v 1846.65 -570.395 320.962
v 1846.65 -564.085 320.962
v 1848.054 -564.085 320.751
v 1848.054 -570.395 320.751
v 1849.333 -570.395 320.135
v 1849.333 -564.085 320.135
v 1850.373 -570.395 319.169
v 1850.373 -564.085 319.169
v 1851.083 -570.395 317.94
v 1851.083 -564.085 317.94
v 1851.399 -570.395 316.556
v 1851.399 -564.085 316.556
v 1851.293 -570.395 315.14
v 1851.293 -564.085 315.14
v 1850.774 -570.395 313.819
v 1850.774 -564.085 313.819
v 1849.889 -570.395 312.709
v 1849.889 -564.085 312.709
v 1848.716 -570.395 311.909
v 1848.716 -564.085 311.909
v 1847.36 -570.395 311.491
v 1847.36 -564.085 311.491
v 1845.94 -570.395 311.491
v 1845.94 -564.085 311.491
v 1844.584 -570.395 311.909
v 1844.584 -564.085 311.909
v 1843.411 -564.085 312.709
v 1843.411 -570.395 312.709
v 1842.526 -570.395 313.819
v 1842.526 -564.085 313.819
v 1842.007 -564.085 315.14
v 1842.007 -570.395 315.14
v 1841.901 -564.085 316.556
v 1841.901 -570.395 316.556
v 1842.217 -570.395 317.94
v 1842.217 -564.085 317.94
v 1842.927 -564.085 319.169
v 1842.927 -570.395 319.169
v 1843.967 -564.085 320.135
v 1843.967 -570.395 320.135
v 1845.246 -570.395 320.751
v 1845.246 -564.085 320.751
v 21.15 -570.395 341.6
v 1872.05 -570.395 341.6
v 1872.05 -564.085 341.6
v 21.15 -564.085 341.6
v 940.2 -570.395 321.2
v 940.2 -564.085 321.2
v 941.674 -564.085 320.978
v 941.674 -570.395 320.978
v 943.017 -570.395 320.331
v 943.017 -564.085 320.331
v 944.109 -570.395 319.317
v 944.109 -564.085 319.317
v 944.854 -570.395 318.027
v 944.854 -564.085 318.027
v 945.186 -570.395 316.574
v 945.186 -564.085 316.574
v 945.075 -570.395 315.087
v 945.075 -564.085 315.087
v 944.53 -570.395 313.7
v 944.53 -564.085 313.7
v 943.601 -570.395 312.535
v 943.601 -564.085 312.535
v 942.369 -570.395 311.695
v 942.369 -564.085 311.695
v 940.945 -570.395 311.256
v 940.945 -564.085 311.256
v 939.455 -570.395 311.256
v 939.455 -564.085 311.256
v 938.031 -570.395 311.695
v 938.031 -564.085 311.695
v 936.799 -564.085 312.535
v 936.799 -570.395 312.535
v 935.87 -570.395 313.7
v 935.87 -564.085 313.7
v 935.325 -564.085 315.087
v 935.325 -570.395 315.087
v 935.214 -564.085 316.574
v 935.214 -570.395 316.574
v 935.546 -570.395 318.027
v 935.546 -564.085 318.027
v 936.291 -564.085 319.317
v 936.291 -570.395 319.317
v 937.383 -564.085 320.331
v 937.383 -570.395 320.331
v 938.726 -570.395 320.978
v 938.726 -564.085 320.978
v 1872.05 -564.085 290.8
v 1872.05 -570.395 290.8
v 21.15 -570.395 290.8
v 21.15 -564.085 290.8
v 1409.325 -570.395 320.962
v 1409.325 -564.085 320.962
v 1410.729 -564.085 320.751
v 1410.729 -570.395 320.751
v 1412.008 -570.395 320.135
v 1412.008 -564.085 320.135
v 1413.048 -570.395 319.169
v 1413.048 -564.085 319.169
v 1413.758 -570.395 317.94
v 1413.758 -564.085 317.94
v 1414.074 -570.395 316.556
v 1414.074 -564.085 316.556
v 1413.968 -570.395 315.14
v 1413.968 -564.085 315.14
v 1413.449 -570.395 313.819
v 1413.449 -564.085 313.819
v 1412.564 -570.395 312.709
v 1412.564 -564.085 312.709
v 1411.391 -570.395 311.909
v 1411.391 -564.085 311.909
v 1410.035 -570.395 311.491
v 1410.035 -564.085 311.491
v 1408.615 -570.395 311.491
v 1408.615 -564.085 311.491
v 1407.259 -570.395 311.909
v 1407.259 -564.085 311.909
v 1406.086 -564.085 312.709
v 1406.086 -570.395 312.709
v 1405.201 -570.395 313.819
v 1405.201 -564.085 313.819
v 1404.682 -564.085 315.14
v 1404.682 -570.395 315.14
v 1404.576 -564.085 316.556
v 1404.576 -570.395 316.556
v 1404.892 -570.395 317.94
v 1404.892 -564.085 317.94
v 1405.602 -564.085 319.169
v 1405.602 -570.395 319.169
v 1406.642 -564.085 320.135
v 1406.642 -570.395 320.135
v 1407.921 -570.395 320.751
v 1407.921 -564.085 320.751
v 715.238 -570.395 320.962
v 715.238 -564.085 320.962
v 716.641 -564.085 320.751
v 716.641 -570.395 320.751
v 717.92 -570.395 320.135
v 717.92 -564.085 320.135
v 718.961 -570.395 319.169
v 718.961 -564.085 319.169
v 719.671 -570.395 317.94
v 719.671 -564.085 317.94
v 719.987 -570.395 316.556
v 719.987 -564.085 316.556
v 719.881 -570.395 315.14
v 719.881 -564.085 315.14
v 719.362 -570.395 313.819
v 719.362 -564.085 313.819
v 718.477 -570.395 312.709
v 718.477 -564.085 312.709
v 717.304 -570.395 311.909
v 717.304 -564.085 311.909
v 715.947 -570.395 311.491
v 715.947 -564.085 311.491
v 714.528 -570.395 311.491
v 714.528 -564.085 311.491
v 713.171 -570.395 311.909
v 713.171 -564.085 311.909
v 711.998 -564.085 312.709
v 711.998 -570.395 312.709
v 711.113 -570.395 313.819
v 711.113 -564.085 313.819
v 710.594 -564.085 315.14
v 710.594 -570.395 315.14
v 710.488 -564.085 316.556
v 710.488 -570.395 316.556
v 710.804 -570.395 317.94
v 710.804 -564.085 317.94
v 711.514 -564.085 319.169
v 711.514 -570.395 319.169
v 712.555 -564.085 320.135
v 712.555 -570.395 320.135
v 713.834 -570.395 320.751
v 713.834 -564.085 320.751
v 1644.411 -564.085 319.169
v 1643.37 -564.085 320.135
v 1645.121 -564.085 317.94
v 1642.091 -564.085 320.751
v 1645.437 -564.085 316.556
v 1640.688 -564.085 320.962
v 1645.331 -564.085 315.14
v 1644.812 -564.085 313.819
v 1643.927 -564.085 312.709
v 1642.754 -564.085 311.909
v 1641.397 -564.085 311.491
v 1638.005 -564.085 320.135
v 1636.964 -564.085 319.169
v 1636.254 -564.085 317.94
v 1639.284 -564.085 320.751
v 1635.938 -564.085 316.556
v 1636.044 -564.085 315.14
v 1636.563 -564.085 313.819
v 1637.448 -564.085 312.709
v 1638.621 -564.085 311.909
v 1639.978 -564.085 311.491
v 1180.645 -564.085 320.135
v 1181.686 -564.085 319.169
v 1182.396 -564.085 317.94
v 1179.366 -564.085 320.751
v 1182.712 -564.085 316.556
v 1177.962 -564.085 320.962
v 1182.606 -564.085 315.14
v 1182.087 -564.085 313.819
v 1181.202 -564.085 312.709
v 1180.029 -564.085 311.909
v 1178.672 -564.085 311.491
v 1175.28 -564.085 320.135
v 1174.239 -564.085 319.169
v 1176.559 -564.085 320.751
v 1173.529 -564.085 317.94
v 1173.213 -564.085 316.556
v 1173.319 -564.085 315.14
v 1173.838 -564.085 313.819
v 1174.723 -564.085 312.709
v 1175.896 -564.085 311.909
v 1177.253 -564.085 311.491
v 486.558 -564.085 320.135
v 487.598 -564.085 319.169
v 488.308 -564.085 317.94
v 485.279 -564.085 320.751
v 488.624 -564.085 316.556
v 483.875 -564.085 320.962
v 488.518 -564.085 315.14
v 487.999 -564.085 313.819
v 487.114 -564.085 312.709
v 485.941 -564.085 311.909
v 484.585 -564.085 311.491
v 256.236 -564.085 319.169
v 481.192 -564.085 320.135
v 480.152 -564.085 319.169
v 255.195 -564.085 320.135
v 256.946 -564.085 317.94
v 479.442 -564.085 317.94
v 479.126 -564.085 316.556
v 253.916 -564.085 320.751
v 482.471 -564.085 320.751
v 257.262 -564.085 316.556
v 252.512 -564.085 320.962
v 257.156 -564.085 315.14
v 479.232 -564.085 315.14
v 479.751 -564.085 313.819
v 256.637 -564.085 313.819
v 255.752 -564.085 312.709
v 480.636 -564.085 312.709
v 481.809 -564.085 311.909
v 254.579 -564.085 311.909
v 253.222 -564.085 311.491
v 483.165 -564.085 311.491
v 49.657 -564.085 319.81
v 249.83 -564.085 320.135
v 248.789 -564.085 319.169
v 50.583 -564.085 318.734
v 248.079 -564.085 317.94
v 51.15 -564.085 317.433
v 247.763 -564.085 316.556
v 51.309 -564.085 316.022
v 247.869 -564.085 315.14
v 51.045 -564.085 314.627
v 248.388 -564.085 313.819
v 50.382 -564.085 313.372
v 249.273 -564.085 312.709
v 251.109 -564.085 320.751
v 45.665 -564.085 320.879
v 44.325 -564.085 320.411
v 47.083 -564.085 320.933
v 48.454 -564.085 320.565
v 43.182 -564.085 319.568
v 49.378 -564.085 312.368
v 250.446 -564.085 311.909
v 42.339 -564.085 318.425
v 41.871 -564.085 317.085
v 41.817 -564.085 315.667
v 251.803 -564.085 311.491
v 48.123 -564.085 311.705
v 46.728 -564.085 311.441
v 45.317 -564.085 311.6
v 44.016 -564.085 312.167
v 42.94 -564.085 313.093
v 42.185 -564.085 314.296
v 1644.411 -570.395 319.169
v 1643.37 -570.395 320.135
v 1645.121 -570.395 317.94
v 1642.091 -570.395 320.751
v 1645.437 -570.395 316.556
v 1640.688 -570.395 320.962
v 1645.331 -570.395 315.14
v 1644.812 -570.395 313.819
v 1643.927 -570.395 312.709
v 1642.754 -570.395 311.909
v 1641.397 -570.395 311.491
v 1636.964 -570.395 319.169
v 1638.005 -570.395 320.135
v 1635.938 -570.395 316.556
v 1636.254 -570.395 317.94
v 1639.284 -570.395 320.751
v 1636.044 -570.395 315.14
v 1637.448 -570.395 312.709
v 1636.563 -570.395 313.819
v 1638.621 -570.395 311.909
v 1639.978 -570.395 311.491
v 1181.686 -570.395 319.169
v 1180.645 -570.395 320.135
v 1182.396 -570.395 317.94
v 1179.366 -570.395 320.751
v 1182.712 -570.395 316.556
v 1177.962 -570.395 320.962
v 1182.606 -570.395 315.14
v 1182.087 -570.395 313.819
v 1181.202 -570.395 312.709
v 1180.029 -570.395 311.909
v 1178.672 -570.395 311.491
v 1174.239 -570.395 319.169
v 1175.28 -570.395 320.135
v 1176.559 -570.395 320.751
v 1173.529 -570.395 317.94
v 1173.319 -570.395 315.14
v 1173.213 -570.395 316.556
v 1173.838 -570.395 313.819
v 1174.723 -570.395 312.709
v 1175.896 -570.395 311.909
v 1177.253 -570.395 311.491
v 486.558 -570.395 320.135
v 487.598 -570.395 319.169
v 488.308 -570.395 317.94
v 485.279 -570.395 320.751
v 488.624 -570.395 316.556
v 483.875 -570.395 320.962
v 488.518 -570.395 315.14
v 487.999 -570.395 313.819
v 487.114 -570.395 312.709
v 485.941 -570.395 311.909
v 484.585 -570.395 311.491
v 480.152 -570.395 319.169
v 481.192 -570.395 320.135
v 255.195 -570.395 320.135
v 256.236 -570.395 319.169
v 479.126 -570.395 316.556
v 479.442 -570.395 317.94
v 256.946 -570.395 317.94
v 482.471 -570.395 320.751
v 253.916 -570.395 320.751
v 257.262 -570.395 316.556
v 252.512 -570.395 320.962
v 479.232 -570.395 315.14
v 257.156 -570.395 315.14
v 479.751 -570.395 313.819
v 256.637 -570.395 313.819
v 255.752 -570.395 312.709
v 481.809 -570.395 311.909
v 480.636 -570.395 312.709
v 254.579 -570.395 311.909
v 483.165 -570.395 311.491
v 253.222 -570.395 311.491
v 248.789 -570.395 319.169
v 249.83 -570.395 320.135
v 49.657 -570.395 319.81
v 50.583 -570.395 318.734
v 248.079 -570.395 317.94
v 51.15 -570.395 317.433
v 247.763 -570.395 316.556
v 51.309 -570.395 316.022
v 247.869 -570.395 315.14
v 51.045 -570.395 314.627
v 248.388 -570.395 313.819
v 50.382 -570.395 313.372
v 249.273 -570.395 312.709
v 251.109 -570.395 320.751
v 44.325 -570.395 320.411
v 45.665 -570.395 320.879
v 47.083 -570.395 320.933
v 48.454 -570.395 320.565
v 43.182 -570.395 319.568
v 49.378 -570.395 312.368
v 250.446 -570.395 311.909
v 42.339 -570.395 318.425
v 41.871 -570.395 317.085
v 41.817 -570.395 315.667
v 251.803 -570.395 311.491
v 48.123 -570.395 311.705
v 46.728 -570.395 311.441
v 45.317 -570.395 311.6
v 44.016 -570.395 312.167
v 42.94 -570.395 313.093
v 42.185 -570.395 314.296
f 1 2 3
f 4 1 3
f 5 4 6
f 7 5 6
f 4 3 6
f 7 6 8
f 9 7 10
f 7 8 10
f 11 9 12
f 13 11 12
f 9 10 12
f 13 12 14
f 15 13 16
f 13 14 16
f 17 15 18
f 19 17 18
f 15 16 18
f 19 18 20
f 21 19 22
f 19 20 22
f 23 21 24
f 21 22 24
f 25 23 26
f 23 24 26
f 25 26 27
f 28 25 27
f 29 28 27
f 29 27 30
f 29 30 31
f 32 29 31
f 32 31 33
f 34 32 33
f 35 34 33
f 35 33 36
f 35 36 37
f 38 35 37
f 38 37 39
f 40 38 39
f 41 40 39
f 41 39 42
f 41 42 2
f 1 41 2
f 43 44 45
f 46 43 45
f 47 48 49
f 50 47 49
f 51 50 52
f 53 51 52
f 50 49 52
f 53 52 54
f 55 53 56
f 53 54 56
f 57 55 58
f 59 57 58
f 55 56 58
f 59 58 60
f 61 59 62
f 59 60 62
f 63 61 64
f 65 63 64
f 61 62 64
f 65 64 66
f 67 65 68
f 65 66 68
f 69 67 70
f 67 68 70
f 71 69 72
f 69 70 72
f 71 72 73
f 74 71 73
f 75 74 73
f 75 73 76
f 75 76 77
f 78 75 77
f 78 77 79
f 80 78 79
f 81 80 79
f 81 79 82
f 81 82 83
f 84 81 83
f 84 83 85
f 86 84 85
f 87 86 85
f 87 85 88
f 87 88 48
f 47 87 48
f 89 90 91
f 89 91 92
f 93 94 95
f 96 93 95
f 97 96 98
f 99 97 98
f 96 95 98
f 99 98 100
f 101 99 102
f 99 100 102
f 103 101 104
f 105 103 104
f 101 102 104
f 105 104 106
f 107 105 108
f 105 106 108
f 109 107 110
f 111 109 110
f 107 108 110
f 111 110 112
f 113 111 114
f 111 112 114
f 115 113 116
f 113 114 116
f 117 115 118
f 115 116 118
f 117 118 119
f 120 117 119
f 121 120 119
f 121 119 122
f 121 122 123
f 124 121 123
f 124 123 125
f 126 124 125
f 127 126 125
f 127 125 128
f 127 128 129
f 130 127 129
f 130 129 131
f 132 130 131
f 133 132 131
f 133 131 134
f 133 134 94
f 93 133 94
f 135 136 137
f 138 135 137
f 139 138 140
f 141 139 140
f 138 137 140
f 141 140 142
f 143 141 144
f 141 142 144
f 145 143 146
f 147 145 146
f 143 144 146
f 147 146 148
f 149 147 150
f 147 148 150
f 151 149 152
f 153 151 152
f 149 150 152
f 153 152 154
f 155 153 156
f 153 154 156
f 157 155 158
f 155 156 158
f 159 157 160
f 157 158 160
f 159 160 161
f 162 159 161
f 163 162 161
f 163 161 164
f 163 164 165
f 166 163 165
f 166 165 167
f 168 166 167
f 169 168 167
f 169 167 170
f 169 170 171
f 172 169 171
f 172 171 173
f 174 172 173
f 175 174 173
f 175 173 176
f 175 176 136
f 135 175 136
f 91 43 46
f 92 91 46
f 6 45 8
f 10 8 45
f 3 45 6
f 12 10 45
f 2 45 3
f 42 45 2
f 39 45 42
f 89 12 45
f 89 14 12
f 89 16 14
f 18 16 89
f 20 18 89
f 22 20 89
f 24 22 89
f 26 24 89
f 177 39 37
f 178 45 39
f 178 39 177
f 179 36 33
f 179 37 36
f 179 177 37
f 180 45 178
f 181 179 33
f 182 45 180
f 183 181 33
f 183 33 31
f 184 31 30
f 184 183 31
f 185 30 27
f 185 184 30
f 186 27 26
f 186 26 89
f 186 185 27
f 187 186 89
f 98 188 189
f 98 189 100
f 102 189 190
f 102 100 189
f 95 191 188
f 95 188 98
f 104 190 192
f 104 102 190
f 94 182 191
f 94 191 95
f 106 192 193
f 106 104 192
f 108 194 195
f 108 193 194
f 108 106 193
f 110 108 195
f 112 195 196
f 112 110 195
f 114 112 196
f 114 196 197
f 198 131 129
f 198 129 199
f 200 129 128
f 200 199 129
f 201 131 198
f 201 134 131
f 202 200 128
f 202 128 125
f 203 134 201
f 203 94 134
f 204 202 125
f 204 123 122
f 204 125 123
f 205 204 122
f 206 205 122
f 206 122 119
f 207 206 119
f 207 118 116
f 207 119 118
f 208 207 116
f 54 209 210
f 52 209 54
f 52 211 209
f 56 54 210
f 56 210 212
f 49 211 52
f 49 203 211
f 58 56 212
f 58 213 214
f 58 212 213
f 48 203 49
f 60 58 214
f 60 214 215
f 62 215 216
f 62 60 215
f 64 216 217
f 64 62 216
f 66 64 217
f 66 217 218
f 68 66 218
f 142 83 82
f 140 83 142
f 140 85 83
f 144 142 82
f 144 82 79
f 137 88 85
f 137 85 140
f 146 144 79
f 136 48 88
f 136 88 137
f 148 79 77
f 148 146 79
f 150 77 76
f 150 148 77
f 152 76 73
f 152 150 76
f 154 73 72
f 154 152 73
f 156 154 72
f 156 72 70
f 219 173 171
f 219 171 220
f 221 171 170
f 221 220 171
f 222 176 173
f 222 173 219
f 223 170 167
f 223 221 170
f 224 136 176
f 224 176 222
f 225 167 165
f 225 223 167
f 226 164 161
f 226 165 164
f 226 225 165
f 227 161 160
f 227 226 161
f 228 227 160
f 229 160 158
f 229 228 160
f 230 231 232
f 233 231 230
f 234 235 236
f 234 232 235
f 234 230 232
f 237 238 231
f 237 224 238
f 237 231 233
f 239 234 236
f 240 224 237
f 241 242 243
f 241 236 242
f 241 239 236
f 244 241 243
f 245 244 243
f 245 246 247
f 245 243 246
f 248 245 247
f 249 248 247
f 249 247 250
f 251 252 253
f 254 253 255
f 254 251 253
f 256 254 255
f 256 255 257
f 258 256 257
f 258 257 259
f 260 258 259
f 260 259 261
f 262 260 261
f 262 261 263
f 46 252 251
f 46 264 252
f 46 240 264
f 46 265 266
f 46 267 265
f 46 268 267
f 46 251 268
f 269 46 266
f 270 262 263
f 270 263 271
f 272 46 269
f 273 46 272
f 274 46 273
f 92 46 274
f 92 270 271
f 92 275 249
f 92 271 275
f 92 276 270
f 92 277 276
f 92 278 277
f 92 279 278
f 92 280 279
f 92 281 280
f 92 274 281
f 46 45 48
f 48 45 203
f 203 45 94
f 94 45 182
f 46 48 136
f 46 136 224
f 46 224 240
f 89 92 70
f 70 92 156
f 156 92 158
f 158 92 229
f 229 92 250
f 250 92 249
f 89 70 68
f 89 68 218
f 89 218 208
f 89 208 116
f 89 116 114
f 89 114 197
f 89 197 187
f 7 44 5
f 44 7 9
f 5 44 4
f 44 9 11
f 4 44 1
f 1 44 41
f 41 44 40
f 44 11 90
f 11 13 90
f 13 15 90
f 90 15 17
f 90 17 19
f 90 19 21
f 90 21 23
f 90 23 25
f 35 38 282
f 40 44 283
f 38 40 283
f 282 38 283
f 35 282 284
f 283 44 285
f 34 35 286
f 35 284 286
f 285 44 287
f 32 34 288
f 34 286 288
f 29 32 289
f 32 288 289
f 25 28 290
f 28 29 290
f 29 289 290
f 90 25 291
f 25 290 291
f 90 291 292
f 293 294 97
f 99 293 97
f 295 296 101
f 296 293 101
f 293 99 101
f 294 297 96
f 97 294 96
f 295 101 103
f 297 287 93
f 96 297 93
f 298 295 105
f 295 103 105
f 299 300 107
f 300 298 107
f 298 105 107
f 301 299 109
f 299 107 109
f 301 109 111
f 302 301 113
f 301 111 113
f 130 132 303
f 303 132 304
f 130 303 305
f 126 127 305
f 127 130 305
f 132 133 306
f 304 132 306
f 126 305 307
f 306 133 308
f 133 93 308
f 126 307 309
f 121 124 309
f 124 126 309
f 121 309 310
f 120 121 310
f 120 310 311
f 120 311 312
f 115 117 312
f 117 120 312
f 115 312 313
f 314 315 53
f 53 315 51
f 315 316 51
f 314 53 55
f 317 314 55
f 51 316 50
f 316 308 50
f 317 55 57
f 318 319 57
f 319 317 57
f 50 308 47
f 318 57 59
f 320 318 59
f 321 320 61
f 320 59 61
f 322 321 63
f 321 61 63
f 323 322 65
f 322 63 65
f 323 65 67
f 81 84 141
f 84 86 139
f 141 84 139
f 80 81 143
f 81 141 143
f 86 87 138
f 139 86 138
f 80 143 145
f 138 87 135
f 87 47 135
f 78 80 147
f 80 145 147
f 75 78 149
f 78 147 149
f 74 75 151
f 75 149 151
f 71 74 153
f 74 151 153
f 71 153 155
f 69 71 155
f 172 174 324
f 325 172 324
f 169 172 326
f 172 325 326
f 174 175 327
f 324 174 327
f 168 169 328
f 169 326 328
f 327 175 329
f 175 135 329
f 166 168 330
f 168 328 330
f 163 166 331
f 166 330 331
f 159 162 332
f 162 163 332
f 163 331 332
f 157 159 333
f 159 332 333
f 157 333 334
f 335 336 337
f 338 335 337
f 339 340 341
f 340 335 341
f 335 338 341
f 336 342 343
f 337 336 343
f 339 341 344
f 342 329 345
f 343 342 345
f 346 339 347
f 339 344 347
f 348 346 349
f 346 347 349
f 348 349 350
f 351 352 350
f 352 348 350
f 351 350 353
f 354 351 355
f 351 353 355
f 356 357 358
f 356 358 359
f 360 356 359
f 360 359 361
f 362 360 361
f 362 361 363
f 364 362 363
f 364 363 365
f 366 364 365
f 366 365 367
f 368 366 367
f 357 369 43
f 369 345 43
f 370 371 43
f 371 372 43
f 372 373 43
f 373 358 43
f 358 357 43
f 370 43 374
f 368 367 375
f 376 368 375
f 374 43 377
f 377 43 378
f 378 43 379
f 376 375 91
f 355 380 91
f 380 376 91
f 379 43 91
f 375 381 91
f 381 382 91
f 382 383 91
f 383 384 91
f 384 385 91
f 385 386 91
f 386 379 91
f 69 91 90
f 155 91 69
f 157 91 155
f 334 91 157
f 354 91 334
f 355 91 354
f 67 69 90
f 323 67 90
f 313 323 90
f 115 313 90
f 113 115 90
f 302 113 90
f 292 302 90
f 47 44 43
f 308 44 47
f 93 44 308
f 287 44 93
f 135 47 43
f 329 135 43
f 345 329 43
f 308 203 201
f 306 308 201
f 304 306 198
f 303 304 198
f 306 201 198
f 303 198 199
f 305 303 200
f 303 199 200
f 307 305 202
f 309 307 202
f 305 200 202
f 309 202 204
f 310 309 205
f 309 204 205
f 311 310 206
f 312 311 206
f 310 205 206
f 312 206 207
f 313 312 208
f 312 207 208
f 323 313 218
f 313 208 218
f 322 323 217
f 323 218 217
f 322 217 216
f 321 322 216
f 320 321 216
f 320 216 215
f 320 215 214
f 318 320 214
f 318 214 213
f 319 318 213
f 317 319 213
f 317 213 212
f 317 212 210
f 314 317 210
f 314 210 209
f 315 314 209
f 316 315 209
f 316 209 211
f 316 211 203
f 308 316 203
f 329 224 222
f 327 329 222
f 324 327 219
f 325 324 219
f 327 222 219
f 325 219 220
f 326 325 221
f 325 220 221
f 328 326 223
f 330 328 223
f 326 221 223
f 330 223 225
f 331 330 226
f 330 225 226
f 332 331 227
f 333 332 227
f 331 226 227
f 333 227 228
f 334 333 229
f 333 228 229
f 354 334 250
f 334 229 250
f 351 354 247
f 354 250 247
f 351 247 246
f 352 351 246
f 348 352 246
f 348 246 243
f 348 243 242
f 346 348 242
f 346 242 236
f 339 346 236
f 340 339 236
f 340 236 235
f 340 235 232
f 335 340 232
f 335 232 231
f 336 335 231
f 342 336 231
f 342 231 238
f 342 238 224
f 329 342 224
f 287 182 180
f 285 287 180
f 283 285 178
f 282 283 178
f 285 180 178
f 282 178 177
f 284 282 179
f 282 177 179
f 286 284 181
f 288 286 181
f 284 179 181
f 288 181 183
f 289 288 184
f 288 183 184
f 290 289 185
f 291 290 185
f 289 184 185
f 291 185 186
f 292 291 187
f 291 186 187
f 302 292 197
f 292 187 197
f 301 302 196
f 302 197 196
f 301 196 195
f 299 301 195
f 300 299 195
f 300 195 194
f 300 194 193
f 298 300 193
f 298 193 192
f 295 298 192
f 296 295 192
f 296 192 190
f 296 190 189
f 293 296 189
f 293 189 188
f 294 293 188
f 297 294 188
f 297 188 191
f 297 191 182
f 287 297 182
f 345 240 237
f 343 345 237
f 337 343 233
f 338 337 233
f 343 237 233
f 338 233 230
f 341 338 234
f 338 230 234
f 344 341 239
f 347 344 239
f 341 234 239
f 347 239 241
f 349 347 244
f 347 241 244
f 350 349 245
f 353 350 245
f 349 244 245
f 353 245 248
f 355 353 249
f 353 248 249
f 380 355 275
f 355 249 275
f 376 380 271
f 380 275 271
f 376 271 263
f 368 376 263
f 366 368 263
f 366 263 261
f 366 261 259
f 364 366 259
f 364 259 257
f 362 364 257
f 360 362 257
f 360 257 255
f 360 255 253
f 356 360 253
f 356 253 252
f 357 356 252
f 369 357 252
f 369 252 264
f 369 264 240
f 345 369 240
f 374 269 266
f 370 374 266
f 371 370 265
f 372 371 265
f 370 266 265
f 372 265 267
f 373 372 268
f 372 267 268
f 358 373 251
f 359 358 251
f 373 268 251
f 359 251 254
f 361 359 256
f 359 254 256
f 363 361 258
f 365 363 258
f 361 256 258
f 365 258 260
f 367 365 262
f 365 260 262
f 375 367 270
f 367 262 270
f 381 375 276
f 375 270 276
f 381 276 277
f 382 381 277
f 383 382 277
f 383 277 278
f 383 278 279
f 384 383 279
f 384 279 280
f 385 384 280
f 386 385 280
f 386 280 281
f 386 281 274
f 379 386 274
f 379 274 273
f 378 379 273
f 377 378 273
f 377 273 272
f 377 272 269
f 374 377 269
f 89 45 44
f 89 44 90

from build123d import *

# Parameters (mm, degrees)
CROQUIS2_W               = 50.8
CROQUIS2_H               = 6.31
CROQUIS3_W               = 50.8
CROQUIS3_H               = 6.31
CROQUIS4_W               = 60
CROQUIS4_H               = 53.155
SALIENTE_EXTRUIR1_DEPTH  = 6.31
CROQUIS5_W               = 60
CROQUIS5_H               = 6.31
CORTAR_EXTRUIR1_DEPTH    = 6.31
CORTAR_EXTRUIR2_DEPTH    = 502
CROQUIS8_W               = 50.8
CROQUIS8_H               = 564.085
CORTAR_EXTRUIR3_DEPTH    = 502
CROQUIS9_W               = 314.3
CROQUIS9_H               = 1090.402933
CORTAR_EXTRUIR4_DEPTH    = 502
CROQUIS10_W              = 50.8
CROQUIS10_H              = 6.31
CORTAR_EXTRUIR5_DEPTH    = 95
CORTAR_EXTRUIR6_DEPTH    = 95
CROQUIS13_W              = 120
CROQUIS13_H              = 249.755
CORTAR_EXTRUIR7_DEPTH    = 95
CROQUIS16_W              = 125
CROQUIS16_H              = 50.8
SALIENTE_EXTRUIR4_DEPTH  = 6.31
CROQUIS17_W              = 50.8
CROQUIS17_H              = 6.31
SALIENTE_EXTRUIR5_DEPTH  = 50.8
SALIENTE_EXTRUIR6_DEPTH  = 50.8
CROQUIS21_W              = 10
CROQUIS21_H              = 50.8
CORTAR_EXTRUIR9_DEPTH    = 53
CROQUIS22_W              = 0.1
CROQUIS22_H              = 50.8
CORTAR_EXTRUIR10_DEPTH   = 10
CORTAR_EXTRUIR11_DEPTH   = 237
CROQUIS24_W              = 50.8
CROQUIS24_H              = 204.986160176
CORTAR_EXTRUIR12_DEPTH   = 237
CROQUIS25_W              = 50.8
CROQUIS25_H              = 6.31
SALIENTE_EXTRUIR7_DEPTH  = 1.1
CROQUIS26_W              = 50.8
CROQUIS26_H              = 6.31
SALIENTE_EXTRUIR8_DEPTH  = 12.7
CROQUIS27_R              = 5
CORTAR_EXTRUIR13_DEPTH   = 10
CROQUIS28_W              = 0.1
CROQUIS28_H              = 50.8
SALIENTE_EXTRUIR9_DEPTH  = 6.31
CROQUIS29_W              = 50.8
CROQUIS29_H              = 0.1
CORTAR_EXTRUIR14_DEPTH   = 50
CROQUIS30_W              = 50.8
CROQUIS30_H              = 6.31
SALIENTE_EXTRUIR10_DEPTH = 50.8
CROQUIS31_R              = 4.7625
CORTAR_EXTRUIR15_DEPTH   = 10
CROQUIS32_R              = 4.7625
CORTAR_EXTRUIR16_DEPTH   = 33
CROQUIS33_R              = 4.7625
CORTAR_EXTRUIR17_DEPTH   = 50
CROQUIS34_R              = 4.7625
CORTAR_EXTRUIR18_DEPTH   = 82
CROQUIS35_R              = 5
CORTAR_EXTRUIR19_DEPTH   = 10
CROQUIS36_W              = 50.8
CROQUIS36_H              = 186.08
CORTAR_EXTRUIR20_DEPTH   = 10


with BuildPart() as part:
    # Barrer1: sweep along a curve in space
    with BuildLine() as barrer1_path:
        Line((0, 0, 0), (0, -567.24, 0))
        Line((0, -567.24, 0), (0, -567.24, 316.2))
        Line((0, -567.24, 316.2), (1793.15, -567.24, 316.2))
        Line((1793.15, -567.24, 316.2), (1793.15, -567.24, 578))
        Line((1793.15, -567.24, 578), (1793.15, -435.47278313, 578))
        Line((1793.15, -435.47278313, 578), (1793.15, -435.47278313, 1432.002933))
    # Croquis2 → Barrer1 (sweep)
    with BuildSketch(Plane(origin=(0, 0, 0), x_dir=(1, 0, 0), z_dir=(0, 1, 0))):
        Rectangle(CROQUIS2_W, CROQUIS2_H)
        with Locations((263.5, 0)):
            Rectangle(CROQUIS2_W, CROQUIS2_H)
    sweep(path=barrer1_path.line, transition=Transition.RIGHT)

    # Barrer4: sweep along a curve in space
    with BuildLine() as barrer4_path:
        Line((-0.201028049, -3.155, -3.155), (-0.201028049, -3.155, -207.155))
        Line((-0.201028049, -3.155, -207.155), (-0.201028049, -53.155, -207.155))
    # Croquis3 → Barrer4 (sweep)
    with BuildSketch(Plane(origin=(0, 0, -3.155), x_dir=(-1, 0, 0), z_dir=(0, 0, -1))):
        with Locations((-263.5, -3.155)):
            Rectangle(CROQUIS3_W, CROQUIS3_H)
        with Locations((0, -3.155)):
            Rectangle(CROQUIS3_W, CROQUIS3_H)
    sweep(path=barrer4_path.line, transition=Transition.RIGHT)

    # Croquis4 → Saliente-Extruir1 (add)
    with BuildSketch(Plane(origin=(0, 0, -210.31), x_dir=(-1, 0, 0), z_dir=(0, 0, -1))):
        with Locations((-208.1, -26.5775)):
            Rectangle(CROQUIS4_W, CROQUIS4_H)
    extrude(amount=-SALIENTE_EXTRUIR1_DEPTH)

    # Croquis5 → Cortar-Extruir1 (cut)
    with BuildSketch(Plane.XY.offset(-204)):
        with Locations((208.1, -3.155)):
            Rectangle(CROQUIS5_W, CROQUIS5_H)
    extrude(amount=-CORTAR_EXTRUIR1_DEPTH, mode=Mode.SUBTRACT)

    # Croquis7 → Cortar-Extruir2 (cut)
    with BuildSketch(Plane.XY.offset(3.155)):
        Polygon((288.9, -564.085), (238.1, -564.085), (238.1, -68.875540851), (170.611072112, -68.875540851), (170.611072112, 0), (288.9, 0), align=None)
    extrude(amount=-CORTAR_EXTRUIR2_DEPTH, mode=Mode.SUBTRACT)

    # Croquis8 → Cortar-Extruir3 (cut)
    with BuildSketch(Plane.XY.offset(3.155)):
        with Locations((0, -282.0425)):
            Rectangle(CROQUIS8_W, CROQUIS8_H)
    extrude(amount=-CORTAR_EXTRUIR3_DEPTH, mode=Mode.SUBTRACT)

    # Croquis9 → Cortar-Extruir4 (cut)
    with BuildSketch(Plane(origin=(0, -432.31778313, 0), x_dir=(1, 0, 0), z_dir=(0, 1, 0))):
        with Locations((1924.9, -886.8014665)):
            Rectangle(CROQUIS9_W, CROQUIS9_H)
    extrude(amount=-CORTAR_EXTRUIR4_DEPTH, mode=Mode.SUBTRACT)

    # Croquis10 → Cortar-Extruir5 (cut)
    with BuildSketch(Plane(origin=(0, 0, -3.155), x_dir=(-1, 0, 0), z_dir=(0, 0, -1))):
        with Locations((0, -567.24)):
            Rectangle(CROQUIS10_W, CROQUIS10_H)
    extrude(amount=-CORTAR_EXTRUIR5_DEPTH, mode=Mode.SUBTRACT)

    # Croquis11 → Cortar-Extruir6 (cut)
    with BuildSketch(Plane(origin=(0, -564.085, 0), x_dir=(1, 0, 0), z_dir=(0, 1, 0))):
        Polygon((238.1, -78.1), (288.9, -78.1), (288.9, -27.3), align=None)
        Polygon((238.1, -78.1), (288.9, -27.3), (238.1, -27.3), align=None)
        Polygon((238.1, -27.3), (288.9, -27.3), (288.9, -3.155), (288.9, 3.155), (238.1, 3.155), (238.1, -3.155), align=None)
    extrude(amount=-CORTAR_EXTRUIR6_DEPTH, mode=Mode.SUBTRACT)

    # Croquis13 → Cortar-Extruir7 (cut)
    with BuildSketch(Plane(origin=(0, -564.085, 0), x_dir=(1, 0, 0), z_dir=(0, 1, 0))):
        with Locations((34.6, -216.7225)):
            Rectangle(CROQUIS13_W, CROQUIS13_H)
    extrude(amount=-CORTAR_EXTRUIR7_DEPTH, mode=Mode.SUBTRACT)

    # Croquis16 → Saliente-Extruir4 (add)
    with BuildSketch(Plane(origin=(0, -564.085, 0), x_dir=(1, 0, 0), z_dir=(0, 1, 0))):
        with Locations((226.4, -52.7)):
            Rectangle(CROQUIS16_W, CROQUIS16_H)
    extrude(amount=-SALIENTE_EXTRUIR4_DEPTH)

    # Barrer5: sweep along a curve in space
    with BuildLine() as barrer5_path:
        Line((94.6, -567.24, 316.2), (46.55, -567.24, 316.2))
        Line((46.55, -567.24, 316.2), (46.55, -567.24, 105.72))
    # Croquis17 → Barrer5 (sweep)
    with BuildSketch(Plane.ZY.offset(-94.6)):
        with Locations((316.2, -567.24)):
            Rectangle(CROQUIS17_W, CROQUIS17_H)
    sweep(path=barrer5_path.line, transition=Transition.RIGHT)

    # Croquis20 → Saliente-Extruir6 (add)
    with BuildSketch(Plane.ZY.offset(-163.9)):
        Polygon((78.1, -564.085), (78.1, -439.884522326), (59.966060883, -387.925515276), (54.008468178, -390.004743297), (71.79, -440.954001003), (71.79, -564.085), align=None)
    extrude(amount=-SALIENTE_EXTRUIR6_DEPTH)

    # Croquis21 → Cortar-Extruir9 (cut)
    with BuildSketch(Plane(origin=(0, -564.085, 0), x_dir=(1, 0, 0), z_dir=(0, 1, 0))):
        with Locations((1813.55, -316.2)):
            Rectangle(CROQUIS21_W, CROQUIS21_H)
    extrude(amount=-CORTAR_EXTRUIR9_DEPTH, mode=Mode.SUBTRACT)

    # Croquis22 → Cortar-Extruir10 (cut)
    with BuildSketch(Plane(origin=(0, -564.085, 0), x_dir=(1, 0, 0), z_dir=(0, 1, 0))):
        with Locations((72, -316.2)):
            Rectangle(CROQUIS22_W, CROQUIS22_H)
    extrude(amount=-CORTAR_EXTRUIR10_DEPTH, mode=Mode.SUBTRACT)

    # Croquis23 → Cortar-Extruir11 (cut)
    with BuildSketch(Plane.XZ.offset(570.395)):
        Polygon((2031.25, 341.6), (2031.25, 78.1), (163.9, 78.1), (163.9, 0), (2111.300371304, 0), (2111.300371304, 341.6), align=None)
    extrude(amount=-CORTAR_EXTRUIR11_DEPTH, mode=Mode.SUBTRACT)

    # Croquis25 → Saliente-Extruir7 (add)
    with BuildSketch(Plane(origin=(0, 0, 105.72), x_dir=(-1, 0, 0), z_dir=(0, 0, -1))):
        with Locations((-46.55, -567.24)):
            Rectangle(CROQUIS25_W, CROQUIS25_H)
    extrude(amount=SALIENTE_EXTRUIR7_DEPTH)

    # Croquis26 → Saliente-Extruir8 (add)
    with BuildSketch(Plane(origin=(1808.55, 0, 0), x_dir=(0, 0, -1), z_dir=(1, 0, 0))):
        with Locations((-316.2, -567.24)):
            Rectangle(CROQUIS26_W, CROQUIS26_H)
    extrude(amount=SALIENTE_EXTRUIR8_DEPTH)

    # Croquis27 → Cortar-Extruir13 (cut)
    with BuildSketch(Plane(origin=(0, -564.085, 0), x_dir=(1, 0, 0), z_dir=(0, 1, 0))):
        with Locations(Location((940.200000079, -316.2, 0), (0, 0, 270))):
            Circle(CROQUIS27_R)
    extrude(amount=-CORTAR_EXTRUIR13_DEPTH, mode=Mode.SUBTRACT)

    # Croquis28 → Saliente-Extruir9 (add)
    with BuildSketch(Plane(origin=(0, -564.085, 0), x_dir=(1, 0, 0), z_dir=(0, 1, 0))):
        with Locations((72, -316.2)):
            Rectangle(CROQUIS28_W, CROQUIS28_H)
    extrude(amount=-SALIENTE_EXTRUIR9_DEPTH)

    # Croquis29 → Cortar-Extruir14 (cut)
    with BuildSketch(Plane(origin=(0, -564.085, 0), x_dir=(1, 0, 0), z_dir=(0, 1, 0))):
        with Locations((46.55, -290.75)):
            Rectangle(CROQUIS29_W, CROQUIS29_H)
    extrude(amount=-CORTAR_EXTRUIR14_DEPTH, mode=Mode.SUBTRACT)


with BuildPart() as body_2:
    # Croquis18 → Saliente-Extruir5 (new body)
    with BuildSketch(Plane.ZY.offset(-21.15)):
        Polygon((98.787204793, -564.085), (98.787204793, -435.522965931), (64.969988324, -367.622744457), (59.321737777, -370.435814978), (91.897545374, -435.843461779), (91.842933, -564.085), align=None)
    extrude(amount=-SALIENTE_EXTRUIR5_DEPTH)

    # Croquis24 → Cortar-Extruir12 (cut)
    with BuildSketch(Plane.XY.offset(98.787204793)):
        with Locations((46.55, -461.591919912)):
            Rectangle(CROQUIS24_W, CROQUIS24_H)
    extrude(amount=-CORTAR_EXTRUIR12_DEPTH, mode=Mode.SUBTRACT)


with BuildPart() as cortar_extruir14_piece_1:
    # of the separate pieces the step leaves, piece 1, a body of its own (cortar_extruir14_pieces)
    add(part.part.solids().sort_by_distance((1821.25, -570.395, 341.6))[0])

    # Croquis30 → Saliente-Extruir10 (add)
    with BuildSketch(Plane(origin=(1821.25, 0, 0), x_dir=(0, 0, -1), z_dir=(1, 0, 0))):
        with Locations((-316.2, -567.24)):
            Rectangle(CROQUIS30_W, CROQUIS30_H)
    extrude(amount=SALIENTE_EXTRUIR10_DEPTH)

    # Croquis31 → Cortar-Extruir15 (cut)
    with BuildSketch(Plane(origin=(0, -564.085, 0), x_dir=(1, 0, 0), z_dir=(0, 1, 0))):
        with Locations(Location((1846.65, -316.2, 0), (0, 0, 270))):
            Circle(CROQUIS31_R)
    extrude(amount=-CORTAR_EXTRUIR15_DEPTH, mode=Mode.SUBTRACT)

    # Croquis32 → Cortar-Extruir16 (cut)
    with BuildSketch(Plane(origin=(0, -564.085, 0), x_dir=(1, 0, 0), z_dir=(0, 1, 0))):
        with Locations(Location((46.55, -316.2, 0), (0, 0, 225))):
            Circle(CROQUIS32_R)
    extrude(amount=-CORTAR_EXTRUIR16_DEPTH, mode=Mode.SUBTRACT)

    # Croquis34 → Cortar-Extruir18 (cut)
    with BuildSketch(Plane(origin=(0, -564.085, 0), x_dir=(1, 0, 0), z_dir=(0, 1, 0))):
        with Locations(Location((1640.6875, -316.2, 0), (0, 0, 270))):
            Circle(CROQUIS34_R)
        with Locations(Location((1409.325, -316.2, 0), (0, 0, 270))):
            Circle(CROQUIS34_R)
        with Locations(Location((1177.9625, -316.2, 0), (0, 0, 270))):
            Circle(CROQUIS34_R)
        with Locations(Location((715.2375, -316.2, 0), (0, 0, 270))):
            Circle(CROQUIS34_R)
        with Locations(Location((483.875, -316.2, 0), (0, 0, 270))):
            Circle(CROQUIS34_R)
        with Locations(Location((252.5125, -316.2, 0), (0, 0, 270))):
            Circle(CROQUIS34_R)
    extrude(amount=-CORTAR_EXTRUIR18_DEPTH, mode=Mode.SUBTRACT)


with BuildPart() as cortar_extruir14_piece_2:
    # of the separate pieces the step leaves, piece 2, a body of its own (cortar_extruir14_pieces)
    add(part.part.solids().sort_by_distance((21.15, -570.395, 290.7))[0])

    # Croquis33 → Cortar-Extruir17 (cut)
    with BuildSketch(Plane(origin=(0, -570.395, 0), x_dir=(-1, 0, 0), z_dir=(0, -1, 0))):
        with Locations(Location((-33.85, -252.7, 0), (0, 0, 90))):
            Circle(CROQUIS33_R)
        with Locations(Location((-59.25, -278.1, 0), (0, 0, 90))):
            Circle(CROQUIS33_R)
    extrude(amount=-CORTAR_EXTRUIR17_DEPTH, mode=Mode.SUBTRACT)

    # Croquis35 → Cortar-Extruir19 (cut)
    with BuildSketch(Plane(origin=(0, -564.085, 0), x_dir=(1, 0, 0), z_dir=(0, 1, 0))):
        with Locations(Location((46.552050791, -160.802067, 0), (0, 0, 270))):
            Circle(CROQUIS35_R)
    extrude(amount=-CORTAR_EXTRUIR19_DEPTH, mode=Mode.SUBTRACT)

    # Croquis36 → Cortar-Extruir20 (cut)
    with BuildSketch(Plane(origin=(0, -564.085, 0), x_dir=(1, 0, 0), z_dir=(0, 1, 0))):
        with Locations((46.55, -197.66)):
            Rectangle(CROQUIS36_W, CROQUIS36_H)
    extrude(amount=-CORTAR_EXTRUIR20_DEPTH, mode=Mode.SUBTRACT)


solid = cortar_extruir14_piece_1.part
